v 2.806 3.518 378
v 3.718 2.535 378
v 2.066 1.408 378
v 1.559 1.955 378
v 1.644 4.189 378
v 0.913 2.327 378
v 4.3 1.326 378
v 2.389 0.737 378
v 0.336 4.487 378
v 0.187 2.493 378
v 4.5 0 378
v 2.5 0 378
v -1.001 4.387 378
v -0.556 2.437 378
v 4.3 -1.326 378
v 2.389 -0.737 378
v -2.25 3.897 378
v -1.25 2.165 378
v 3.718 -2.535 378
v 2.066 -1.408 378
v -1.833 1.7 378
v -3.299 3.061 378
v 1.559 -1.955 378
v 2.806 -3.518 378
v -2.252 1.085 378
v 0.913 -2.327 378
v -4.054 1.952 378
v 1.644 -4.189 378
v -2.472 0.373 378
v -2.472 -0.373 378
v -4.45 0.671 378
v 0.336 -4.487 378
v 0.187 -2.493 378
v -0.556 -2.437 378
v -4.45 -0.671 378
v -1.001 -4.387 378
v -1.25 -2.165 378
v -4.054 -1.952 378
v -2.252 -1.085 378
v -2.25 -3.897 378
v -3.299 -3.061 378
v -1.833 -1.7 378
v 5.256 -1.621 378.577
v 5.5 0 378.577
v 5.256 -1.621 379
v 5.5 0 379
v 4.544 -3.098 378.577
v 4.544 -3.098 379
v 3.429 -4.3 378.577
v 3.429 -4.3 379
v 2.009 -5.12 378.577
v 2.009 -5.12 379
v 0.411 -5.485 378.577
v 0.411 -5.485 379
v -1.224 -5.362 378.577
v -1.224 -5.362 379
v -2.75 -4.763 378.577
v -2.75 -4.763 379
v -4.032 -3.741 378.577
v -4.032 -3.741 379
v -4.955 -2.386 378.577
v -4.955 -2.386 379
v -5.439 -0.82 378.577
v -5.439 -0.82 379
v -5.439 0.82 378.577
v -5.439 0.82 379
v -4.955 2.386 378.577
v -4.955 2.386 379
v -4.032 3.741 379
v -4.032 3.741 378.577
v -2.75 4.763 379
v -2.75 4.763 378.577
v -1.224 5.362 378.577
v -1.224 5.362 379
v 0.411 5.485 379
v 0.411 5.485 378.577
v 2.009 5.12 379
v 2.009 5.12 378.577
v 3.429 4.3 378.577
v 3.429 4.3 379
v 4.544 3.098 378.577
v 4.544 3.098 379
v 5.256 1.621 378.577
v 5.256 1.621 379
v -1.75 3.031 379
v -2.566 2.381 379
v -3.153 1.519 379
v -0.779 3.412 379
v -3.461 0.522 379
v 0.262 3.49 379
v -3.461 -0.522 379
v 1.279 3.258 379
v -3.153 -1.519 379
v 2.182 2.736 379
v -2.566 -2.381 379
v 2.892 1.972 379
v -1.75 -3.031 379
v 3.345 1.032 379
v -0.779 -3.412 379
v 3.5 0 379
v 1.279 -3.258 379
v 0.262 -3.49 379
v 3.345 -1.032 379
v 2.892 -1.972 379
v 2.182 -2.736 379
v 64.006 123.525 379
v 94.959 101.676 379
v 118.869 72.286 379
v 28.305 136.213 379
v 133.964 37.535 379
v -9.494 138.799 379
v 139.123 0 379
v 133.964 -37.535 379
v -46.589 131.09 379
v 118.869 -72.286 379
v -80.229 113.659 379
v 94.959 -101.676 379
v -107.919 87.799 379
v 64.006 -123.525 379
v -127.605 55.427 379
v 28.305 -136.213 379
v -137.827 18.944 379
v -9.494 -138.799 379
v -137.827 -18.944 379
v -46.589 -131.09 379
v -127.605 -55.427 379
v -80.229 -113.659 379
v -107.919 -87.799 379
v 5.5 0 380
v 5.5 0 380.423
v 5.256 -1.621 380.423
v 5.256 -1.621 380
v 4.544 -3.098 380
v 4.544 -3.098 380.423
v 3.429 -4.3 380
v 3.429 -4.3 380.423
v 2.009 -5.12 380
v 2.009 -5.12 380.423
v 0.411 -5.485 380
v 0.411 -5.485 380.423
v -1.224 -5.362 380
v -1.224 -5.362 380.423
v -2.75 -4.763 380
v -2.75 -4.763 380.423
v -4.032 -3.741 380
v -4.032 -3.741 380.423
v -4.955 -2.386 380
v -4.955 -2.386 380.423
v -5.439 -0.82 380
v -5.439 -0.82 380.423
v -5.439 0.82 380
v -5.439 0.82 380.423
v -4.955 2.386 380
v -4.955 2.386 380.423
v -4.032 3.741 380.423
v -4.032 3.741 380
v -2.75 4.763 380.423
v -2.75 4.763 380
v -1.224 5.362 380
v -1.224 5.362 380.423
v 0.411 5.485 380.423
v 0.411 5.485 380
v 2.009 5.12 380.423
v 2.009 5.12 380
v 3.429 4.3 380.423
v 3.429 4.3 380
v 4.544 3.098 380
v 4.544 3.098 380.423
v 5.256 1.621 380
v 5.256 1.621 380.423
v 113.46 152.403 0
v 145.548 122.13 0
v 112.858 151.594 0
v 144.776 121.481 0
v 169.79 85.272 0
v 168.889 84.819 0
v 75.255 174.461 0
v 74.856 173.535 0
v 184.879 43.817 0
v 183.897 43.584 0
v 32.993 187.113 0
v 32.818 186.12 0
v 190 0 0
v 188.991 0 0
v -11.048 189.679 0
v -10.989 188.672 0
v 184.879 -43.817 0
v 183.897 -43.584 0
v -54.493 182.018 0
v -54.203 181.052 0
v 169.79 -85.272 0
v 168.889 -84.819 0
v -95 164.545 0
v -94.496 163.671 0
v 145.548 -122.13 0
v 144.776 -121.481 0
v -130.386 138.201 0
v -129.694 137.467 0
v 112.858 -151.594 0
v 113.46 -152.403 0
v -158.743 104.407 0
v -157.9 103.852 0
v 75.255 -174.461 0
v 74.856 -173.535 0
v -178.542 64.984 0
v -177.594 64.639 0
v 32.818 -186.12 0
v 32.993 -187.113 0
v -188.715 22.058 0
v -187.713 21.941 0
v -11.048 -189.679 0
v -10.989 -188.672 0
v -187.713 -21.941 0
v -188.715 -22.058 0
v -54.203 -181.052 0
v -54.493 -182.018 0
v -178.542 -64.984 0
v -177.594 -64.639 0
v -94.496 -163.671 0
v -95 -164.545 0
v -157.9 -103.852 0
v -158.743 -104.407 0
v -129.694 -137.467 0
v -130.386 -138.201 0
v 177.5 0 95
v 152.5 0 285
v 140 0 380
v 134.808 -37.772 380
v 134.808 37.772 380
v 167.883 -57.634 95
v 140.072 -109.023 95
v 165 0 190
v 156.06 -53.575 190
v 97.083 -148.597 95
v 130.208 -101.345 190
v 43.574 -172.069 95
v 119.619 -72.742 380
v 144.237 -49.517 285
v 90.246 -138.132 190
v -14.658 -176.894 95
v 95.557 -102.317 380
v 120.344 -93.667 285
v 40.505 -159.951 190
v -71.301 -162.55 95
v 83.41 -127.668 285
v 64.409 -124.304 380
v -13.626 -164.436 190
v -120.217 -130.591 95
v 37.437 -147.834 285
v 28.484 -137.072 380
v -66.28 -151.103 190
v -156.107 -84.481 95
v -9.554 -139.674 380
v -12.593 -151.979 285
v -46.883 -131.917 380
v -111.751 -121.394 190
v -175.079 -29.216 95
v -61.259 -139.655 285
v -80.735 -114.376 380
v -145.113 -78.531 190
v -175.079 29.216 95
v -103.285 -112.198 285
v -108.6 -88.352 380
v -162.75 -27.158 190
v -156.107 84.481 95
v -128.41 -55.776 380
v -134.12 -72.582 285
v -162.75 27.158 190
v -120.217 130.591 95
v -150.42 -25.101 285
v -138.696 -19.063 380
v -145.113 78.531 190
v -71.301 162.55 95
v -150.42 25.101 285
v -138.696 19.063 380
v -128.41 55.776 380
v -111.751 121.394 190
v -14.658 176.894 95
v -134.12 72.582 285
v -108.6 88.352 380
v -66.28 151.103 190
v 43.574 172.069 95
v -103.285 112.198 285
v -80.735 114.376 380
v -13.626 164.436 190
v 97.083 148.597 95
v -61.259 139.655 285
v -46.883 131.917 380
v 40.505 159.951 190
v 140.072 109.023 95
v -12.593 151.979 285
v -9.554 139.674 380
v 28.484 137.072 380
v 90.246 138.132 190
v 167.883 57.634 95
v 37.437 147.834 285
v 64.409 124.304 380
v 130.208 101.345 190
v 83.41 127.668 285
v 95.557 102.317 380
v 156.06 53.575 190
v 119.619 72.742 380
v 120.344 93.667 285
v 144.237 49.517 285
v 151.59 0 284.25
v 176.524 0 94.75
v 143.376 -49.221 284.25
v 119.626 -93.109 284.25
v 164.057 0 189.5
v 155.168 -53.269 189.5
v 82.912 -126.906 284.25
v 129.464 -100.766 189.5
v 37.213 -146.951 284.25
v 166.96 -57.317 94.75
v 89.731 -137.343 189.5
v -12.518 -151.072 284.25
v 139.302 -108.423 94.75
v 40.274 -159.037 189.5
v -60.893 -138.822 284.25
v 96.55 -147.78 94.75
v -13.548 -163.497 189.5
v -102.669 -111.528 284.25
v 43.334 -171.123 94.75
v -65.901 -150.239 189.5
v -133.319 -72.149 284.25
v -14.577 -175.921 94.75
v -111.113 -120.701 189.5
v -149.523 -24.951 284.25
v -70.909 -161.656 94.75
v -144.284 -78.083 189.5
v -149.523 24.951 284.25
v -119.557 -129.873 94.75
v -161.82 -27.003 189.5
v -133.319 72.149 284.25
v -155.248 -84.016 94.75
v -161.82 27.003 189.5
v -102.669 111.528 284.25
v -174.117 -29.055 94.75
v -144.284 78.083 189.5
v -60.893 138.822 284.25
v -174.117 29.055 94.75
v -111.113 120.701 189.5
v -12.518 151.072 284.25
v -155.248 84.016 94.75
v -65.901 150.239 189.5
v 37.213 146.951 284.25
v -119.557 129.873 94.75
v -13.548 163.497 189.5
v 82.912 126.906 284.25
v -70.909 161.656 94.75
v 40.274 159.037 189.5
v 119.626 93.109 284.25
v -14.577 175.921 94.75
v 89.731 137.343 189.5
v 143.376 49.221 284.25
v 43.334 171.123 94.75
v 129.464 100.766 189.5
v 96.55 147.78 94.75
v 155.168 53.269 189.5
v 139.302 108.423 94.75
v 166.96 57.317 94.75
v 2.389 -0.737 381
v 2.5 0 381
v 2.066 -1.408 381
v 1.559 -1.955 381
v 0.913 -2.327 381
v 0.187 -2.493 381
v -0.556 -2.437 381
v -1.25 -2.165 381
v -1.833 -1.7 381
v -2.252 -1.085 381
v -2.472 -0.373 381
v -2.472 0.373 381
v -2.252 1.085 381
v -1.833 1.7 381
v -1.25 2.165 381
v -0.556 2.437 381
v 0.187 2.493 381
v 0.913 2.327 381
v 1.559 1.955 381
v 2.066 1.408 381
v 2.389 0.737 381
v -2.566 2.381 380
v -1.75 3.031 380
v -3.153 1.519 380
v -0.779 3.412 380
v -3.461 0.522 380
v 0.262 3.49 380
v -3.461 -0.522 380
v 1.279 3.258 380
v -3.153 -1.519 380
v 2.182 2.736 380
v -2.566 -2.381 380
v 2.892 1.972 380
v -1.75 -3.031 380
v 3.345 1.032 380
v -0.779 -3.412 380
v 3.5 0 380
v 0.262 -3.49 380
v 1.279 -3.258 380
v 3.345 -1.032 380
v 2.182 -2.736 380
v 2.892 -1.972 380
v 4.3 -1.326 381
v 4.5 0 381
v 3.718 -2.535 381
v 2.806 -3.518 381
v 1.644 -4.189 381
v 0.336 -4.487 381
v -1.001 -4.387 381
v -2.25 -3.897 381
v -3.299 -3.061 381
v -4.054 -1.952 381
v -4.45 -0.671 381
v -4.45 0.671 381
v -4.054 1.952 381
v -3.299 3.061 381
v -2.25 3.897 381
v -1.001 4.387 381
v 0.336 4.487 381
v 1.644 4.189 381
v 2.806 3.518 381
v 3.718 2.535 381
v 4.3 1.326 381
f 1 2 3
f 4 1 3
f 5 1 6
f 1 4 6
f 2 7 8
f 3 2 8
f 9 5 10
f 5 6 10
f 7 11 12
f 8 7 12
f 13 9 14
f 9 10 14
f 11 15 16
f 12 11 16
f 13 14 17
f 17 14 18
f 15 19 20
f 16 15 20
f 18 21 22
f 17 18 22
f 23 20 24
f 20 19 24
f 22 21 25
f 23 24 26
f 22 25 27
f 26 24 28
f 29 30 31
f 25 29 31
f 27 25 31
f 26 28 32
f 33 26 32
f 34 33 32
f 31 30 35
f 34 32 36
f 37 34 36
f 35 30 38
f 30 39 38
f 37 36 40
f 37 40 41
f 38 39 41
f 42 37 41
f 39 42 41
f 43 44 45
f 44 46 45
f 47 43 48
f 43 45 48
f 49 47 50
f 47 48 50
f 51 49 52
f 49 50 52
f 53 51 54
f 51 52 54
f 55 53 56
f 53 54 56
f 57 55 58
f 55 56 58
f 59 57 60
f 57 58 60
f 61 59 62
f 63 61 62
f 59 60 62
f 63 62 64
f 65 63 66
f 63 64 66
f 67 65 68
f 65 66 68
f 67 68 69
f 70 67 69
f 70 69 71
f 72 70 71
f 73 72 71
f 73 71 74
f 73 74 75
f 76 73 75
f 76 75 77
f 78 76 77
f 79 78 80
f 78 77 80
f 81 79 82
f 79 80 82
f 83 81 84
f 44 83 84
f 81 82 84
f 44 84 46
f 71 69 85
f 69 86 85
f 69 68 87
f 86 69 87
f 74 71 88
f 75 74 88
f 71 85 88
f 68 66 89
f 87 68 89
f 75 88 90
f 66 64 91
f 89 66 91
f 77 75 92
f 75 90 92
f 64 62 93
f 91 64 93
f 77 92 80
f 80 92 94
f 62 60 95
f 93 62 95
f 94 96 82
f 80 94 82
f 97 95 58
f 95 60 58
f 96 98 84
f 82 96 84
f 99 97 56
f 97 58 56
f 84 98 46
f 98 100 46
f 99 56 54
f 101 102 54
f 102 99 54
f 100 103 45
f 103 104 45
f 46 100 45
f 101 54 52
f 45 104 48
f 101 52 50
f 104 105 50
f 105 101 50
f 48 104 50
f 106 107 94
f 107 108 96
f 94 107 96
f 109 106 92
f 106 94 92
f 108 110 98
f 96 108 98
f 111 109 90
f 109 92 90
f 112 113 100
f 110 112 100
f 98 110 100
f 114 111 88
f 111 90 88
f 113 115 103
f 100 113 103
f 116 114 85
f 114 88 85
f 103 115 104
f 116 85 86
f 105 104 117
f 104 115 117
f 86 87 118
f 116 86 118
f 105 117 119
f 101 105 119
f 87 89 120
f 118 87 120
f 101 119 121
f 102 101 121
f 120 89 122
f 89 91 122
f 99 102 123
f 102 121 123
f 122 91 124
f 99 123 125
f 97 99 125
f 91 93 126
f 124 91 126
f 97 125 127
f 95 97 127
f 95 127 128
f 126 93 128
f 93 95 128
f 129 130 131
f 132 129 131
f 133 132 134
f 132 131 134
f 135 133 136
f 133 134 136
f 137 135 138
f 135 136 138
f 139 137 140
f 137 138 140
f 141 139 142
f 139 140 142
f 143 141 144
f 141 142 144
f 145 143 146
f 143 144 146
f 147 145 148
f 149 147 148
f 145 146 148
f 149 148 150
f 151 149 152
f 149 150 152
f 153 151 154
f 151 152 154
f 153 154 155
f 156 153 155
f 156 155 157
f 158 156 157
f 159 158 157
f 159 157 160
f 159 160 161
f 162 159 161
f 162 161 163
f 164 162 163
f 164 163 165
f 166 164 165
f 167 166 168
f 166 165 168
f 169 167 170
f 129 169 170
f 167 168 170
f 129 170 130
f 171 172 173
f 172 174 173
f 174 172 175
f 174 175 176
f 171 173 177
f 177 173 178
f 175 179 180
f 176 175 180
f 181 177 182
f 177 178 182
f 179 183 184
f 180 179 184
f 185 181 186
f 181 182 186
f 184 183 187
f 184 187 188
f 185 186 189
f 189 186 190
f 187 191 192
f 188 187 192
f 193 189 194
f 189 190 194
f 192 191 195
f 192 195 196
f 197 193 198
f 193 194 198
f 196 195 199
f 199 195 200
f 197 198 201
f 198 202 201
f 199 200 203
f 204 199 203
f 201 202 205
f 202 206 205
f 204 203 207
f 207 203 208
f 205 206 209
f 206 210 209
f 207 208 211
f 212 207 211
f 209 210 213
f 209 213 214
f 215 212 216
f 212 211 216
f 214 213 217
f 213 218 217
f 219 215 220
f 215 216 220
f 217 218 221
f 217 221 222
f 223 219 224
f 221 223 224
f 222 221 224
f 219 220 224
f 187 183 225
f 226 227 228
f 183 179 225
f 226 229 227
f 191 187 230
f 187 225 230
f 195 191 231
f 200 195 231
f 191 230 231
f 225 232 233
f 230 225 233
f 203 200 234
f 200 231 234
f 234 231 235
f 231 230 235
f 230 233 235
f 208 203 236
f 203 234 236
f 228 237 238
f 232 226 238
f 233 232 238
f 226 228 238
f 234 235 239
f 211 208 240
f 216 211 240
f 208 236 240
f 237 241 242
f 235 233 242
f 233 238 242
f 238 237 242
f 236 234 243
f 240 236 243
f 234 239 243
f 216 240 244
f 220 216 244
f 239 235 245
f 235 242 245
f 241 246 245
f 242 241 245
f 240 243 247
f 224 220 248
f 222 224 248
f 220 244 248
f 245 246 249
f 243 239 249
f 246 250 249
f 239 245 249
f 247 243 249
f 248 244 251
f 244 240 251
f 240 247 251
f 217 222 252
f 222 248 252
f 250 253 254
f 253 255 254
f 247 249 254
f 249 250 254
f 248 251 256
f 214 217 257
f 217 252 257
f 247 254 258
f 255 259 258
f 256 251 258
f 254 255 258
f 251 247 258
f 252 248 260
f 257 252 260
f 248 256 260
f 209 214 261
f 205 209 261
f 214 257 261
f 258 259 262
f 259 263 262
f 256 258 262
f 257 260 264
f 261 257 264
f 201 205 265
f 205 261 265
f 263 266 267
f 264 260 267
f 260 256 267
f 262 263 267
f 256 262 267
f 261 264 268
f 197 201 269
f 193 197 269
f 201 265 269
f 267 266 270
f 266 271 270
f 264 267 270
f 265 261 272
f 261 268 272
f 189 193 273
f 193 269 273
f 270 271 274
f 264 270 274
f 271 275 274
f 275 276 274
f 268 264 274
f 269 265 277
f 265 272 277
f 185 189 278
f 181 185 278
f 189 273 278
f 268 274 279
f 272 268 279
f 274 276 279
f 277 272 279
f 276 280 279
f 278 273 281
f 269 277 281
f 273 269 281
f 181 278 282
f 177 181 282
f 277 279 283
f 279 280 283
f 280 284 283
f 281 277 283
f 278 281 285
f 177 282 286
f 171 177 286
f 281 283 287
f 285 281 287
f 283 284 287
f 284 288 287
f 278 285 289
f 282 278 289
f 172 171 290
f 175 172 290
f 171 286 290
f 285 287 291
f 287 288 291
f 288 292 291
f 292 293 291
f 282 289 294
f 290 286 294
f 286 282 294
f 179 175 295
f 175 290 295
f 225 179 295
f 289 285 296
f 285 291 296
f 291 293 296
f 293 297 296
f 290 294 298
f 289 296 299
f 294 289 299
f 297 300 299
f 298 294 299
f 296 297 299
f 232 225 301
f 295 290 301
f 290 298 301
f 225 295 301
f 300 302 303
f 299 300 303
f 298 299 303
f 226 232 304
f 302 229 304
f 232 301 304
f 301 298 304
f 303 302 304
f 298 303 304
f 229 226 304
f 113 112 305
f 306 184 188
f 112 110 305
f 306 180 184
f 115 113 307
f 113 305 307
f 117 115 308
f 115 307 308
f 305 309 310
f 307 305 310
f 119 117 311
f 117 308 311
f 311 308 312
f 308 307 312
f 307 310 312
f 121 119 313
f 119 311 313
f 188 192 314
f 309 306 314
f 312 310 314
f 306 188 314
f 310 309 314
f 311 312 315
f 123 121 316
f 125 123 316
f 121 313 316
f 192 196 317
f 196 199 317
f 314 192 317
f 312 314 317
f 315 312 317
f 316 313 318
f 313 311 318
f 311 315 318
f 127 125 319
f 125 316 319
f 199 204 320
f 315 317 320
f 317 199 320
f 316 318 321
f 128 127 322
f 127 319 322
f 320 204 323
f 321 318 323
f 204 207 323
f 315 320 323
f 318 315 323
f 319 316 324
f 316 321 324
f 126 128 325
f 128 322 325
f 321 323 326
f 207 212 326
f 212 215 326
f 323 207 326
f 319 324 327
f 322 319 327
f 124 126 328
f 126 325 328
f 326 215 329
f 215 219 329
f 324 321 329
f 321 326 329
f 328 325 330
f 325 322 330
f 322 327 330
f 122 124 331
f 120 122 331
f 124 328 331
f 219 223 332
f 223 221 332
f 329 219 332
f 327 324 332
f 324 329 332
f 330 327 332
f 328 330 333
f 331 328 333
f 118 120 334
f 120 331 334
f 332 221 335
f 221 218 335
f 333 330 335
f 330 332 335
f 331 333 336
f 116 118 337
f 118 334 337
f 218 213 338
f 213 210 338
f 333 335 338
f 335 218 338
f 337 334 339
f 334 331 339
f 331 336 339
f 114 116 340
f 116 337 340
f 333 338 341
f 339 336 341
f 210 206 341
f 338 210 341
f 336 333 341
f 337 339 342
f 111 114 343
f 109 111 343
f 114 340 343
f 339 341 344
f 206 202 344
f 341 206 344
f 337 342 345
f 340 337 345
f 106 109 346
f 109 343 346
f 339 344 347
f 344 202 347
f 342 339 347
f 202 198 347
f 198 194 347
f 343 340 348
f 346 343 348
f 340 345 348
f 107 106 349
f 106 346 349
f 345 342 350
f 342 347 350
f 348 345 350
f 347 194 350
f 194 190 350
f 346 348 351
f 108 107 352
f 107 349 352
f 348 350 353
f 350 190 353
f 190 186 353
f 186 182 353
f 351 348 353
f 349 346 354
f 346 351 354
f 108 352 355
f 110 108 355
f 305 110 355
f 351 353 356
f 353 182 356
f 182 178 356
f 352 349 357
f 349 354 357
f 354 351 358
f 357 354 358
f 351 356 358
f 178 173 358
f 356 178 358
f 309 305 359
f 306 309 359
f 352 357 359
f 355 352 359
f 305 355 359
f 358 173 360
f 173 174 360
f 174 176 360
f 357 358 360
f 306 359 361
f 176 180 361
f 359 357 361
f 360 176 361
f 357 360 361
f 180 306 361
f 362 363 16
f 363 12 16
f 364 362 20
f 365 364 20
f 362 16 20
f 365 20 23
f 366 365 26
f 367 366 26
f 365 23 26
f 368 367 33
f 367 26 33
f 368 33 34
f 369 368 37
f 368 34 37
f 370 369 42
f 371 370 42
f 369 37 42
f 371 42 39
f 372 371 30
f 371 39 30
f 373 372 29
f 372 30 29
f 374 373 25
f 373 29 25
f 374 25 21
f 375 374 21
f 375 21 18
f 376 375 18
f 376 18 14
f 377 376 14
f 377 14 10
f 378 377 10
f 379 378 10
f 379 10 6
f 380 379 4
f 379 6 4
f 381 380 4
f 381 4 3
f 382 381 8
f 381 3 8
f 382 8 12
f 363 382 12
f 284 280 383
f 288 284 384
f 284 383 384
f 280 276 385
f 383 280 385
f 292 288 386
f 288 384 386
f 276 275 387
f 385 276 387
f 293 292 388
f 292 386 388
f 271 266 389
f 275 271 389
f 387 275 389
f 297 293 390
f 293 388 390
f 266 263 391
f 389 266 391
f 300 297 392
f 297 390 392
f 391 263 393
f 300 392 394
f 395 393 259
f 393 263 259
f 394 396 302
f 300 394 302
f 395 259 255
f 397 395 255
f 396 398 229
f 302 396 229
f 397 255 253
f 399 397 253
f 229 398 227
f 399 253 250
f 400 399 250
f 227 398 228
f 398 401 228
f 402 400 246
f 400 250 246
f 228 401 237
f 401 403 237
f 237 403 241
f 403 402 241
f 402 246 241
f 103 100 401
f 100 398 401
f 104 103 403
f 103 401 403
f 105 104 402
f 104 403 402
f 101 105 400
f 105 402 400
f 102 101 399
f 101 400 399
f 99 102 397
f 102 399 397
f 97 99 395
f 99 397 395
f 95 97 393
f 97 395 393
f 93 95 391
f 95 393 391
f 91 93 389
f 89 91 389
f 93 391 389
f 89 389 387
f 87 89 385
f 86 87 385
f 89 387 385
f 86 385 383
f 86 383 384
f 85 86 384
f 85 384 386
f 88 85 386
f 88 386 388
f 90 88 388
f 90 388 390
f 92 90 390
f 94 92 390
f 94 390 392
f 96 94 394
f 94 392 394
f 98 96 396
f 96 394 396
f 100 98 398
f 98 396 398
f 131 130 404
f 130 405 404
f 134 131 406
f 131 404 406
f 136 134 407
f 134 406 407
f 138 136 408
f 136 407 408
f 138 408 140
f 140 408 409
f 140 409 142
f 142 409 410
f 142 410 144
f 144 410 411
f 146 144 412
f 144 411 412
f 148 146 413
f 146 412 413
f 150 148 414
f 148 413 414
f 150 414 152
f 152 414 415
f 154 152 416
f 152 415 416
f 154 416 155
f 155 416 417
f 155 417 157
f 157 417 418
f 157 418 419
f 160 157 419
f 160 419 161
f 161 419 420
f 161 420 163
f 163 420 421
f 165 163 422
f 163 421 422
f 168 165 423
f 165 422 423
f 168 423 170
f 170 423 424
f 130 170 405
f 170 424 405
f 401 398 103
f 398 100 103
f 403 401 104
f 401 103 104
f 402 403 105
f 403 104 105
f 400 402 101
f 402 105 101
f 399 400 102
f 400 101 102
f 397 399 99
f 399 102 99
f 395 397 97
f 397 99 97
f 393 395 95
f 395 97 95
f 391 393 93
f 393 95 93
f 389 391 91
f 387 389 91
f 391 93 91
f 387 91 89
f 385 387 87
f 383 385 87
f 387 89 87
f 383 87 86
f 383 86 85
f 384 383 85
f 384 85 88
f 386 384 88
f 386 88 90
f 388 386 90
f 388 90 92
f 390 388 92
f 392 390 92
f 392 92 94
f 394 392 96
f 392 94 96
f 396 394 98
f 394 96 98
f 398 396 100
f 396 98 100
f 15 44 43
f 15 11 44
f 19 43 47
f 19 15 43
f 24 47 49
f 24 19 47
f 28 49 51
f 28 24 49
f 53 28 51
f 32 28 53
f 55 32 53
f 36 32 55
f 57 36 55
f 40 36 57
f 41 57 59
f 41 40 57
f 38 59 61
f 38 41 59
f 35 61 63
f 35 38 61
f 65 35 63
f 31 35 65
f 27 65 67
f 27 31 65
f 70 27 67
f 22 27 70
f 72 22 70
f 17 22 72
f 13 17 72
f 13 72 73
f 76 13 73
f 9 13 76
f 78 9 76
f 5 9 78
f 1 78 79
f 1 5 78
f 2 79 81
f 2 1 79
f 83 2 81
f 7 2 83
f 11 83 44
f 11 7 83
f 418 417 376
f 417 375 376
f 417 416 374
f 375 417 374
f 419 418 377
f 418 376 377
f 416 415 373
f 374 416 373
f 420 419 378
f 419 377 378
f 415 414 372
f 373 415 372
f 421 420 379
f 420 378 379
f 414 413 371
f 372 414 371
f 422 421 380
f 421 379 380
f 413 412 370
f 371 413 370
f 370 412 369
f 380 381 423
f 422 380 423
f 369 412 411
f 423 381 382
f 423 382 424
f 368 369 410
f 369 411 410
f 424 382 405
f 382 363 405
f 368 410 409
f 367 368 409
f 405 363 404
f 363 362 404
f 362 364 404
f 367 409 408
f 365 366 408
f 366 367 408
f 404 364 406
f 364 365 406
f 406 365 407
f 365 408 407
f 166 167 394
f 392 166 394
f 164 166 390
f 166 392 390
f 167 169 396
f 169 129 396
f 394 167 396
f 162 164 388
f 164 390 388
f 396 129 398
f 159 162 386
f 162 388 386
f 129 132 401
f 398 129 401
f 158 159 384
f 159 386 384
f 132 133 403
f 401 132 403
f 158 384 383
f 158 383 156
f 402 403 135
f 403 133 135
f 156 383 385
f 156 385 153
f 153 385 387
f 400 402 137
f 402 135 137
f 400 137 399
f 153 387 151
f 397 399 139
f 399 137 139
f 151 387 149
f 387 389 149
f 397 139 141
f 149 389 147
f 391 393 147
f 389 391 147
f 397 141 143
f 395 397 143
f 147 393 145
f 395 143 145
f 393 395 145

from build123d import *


# Not quite as in the source:
# - a fillet or chamfer that OpenCascade refuses, or shapes differently, is made with other operations: its cross-section is extruded or revolved along the edge and cut away or added


with BuildPart() as f1:
    # F0 (on Front) → F1 (revolve)
    with BuildSketch(Plane.XZ):
        Polygon((5.5, 380), (3.5, 380), (3.5, 379), (5.5, 379), (139.1229595844, 379), (188.991380637, 0), (190, 0), (140, 380), align=None)
    revolve(axis=Axis((0, 0, -10.9773641452), (0, 0, -1)))


with BuildPart() as f2:
    # F0 (on Front) → F2 (revolve)
    with BuildSketch(Plane.XZ):
        Polygon((3.5, 379), (3.5, 380), (5.5, 380), (5.5, 381), (2.5, 381), (2.5, 378), (5.5, 378), (5.5, 379), align=None)
    revolve(axis=Axis((0, 0, -10.9773641452), (0, 0, -1)))

    # F3: chamfer of 1 x 0.5773502692 on 1 edges, made by hand

    # F3_s1 → F3_t2 (revolve, cut)
    with BuildSketch(Plane.XZ):
        Polygon((5.5, 380.4226497308), (4.5, 381), (5.5, 381), align=None)
    revolve(axis=Axis((0, 0, 381), (0, 0, -1)), mode=Mode.SUBTRACT)

    # F4: chamfer of 1 x 0.5773502692 on 1 edges, made by hand

    # F4_s1 → F4_t2 (revolve, cut)
    with BuildSketch(Plane.XZ):
        Polygon((5.5, 378.5773502692), (4.5, 378), (5.5, 378), align=None)
    revolve(axis=Axis((0, 0, 378), (0, 0, -1)), mode=Mode.SUBTRACT)


solid = Compound([f1.part, f2.part])
